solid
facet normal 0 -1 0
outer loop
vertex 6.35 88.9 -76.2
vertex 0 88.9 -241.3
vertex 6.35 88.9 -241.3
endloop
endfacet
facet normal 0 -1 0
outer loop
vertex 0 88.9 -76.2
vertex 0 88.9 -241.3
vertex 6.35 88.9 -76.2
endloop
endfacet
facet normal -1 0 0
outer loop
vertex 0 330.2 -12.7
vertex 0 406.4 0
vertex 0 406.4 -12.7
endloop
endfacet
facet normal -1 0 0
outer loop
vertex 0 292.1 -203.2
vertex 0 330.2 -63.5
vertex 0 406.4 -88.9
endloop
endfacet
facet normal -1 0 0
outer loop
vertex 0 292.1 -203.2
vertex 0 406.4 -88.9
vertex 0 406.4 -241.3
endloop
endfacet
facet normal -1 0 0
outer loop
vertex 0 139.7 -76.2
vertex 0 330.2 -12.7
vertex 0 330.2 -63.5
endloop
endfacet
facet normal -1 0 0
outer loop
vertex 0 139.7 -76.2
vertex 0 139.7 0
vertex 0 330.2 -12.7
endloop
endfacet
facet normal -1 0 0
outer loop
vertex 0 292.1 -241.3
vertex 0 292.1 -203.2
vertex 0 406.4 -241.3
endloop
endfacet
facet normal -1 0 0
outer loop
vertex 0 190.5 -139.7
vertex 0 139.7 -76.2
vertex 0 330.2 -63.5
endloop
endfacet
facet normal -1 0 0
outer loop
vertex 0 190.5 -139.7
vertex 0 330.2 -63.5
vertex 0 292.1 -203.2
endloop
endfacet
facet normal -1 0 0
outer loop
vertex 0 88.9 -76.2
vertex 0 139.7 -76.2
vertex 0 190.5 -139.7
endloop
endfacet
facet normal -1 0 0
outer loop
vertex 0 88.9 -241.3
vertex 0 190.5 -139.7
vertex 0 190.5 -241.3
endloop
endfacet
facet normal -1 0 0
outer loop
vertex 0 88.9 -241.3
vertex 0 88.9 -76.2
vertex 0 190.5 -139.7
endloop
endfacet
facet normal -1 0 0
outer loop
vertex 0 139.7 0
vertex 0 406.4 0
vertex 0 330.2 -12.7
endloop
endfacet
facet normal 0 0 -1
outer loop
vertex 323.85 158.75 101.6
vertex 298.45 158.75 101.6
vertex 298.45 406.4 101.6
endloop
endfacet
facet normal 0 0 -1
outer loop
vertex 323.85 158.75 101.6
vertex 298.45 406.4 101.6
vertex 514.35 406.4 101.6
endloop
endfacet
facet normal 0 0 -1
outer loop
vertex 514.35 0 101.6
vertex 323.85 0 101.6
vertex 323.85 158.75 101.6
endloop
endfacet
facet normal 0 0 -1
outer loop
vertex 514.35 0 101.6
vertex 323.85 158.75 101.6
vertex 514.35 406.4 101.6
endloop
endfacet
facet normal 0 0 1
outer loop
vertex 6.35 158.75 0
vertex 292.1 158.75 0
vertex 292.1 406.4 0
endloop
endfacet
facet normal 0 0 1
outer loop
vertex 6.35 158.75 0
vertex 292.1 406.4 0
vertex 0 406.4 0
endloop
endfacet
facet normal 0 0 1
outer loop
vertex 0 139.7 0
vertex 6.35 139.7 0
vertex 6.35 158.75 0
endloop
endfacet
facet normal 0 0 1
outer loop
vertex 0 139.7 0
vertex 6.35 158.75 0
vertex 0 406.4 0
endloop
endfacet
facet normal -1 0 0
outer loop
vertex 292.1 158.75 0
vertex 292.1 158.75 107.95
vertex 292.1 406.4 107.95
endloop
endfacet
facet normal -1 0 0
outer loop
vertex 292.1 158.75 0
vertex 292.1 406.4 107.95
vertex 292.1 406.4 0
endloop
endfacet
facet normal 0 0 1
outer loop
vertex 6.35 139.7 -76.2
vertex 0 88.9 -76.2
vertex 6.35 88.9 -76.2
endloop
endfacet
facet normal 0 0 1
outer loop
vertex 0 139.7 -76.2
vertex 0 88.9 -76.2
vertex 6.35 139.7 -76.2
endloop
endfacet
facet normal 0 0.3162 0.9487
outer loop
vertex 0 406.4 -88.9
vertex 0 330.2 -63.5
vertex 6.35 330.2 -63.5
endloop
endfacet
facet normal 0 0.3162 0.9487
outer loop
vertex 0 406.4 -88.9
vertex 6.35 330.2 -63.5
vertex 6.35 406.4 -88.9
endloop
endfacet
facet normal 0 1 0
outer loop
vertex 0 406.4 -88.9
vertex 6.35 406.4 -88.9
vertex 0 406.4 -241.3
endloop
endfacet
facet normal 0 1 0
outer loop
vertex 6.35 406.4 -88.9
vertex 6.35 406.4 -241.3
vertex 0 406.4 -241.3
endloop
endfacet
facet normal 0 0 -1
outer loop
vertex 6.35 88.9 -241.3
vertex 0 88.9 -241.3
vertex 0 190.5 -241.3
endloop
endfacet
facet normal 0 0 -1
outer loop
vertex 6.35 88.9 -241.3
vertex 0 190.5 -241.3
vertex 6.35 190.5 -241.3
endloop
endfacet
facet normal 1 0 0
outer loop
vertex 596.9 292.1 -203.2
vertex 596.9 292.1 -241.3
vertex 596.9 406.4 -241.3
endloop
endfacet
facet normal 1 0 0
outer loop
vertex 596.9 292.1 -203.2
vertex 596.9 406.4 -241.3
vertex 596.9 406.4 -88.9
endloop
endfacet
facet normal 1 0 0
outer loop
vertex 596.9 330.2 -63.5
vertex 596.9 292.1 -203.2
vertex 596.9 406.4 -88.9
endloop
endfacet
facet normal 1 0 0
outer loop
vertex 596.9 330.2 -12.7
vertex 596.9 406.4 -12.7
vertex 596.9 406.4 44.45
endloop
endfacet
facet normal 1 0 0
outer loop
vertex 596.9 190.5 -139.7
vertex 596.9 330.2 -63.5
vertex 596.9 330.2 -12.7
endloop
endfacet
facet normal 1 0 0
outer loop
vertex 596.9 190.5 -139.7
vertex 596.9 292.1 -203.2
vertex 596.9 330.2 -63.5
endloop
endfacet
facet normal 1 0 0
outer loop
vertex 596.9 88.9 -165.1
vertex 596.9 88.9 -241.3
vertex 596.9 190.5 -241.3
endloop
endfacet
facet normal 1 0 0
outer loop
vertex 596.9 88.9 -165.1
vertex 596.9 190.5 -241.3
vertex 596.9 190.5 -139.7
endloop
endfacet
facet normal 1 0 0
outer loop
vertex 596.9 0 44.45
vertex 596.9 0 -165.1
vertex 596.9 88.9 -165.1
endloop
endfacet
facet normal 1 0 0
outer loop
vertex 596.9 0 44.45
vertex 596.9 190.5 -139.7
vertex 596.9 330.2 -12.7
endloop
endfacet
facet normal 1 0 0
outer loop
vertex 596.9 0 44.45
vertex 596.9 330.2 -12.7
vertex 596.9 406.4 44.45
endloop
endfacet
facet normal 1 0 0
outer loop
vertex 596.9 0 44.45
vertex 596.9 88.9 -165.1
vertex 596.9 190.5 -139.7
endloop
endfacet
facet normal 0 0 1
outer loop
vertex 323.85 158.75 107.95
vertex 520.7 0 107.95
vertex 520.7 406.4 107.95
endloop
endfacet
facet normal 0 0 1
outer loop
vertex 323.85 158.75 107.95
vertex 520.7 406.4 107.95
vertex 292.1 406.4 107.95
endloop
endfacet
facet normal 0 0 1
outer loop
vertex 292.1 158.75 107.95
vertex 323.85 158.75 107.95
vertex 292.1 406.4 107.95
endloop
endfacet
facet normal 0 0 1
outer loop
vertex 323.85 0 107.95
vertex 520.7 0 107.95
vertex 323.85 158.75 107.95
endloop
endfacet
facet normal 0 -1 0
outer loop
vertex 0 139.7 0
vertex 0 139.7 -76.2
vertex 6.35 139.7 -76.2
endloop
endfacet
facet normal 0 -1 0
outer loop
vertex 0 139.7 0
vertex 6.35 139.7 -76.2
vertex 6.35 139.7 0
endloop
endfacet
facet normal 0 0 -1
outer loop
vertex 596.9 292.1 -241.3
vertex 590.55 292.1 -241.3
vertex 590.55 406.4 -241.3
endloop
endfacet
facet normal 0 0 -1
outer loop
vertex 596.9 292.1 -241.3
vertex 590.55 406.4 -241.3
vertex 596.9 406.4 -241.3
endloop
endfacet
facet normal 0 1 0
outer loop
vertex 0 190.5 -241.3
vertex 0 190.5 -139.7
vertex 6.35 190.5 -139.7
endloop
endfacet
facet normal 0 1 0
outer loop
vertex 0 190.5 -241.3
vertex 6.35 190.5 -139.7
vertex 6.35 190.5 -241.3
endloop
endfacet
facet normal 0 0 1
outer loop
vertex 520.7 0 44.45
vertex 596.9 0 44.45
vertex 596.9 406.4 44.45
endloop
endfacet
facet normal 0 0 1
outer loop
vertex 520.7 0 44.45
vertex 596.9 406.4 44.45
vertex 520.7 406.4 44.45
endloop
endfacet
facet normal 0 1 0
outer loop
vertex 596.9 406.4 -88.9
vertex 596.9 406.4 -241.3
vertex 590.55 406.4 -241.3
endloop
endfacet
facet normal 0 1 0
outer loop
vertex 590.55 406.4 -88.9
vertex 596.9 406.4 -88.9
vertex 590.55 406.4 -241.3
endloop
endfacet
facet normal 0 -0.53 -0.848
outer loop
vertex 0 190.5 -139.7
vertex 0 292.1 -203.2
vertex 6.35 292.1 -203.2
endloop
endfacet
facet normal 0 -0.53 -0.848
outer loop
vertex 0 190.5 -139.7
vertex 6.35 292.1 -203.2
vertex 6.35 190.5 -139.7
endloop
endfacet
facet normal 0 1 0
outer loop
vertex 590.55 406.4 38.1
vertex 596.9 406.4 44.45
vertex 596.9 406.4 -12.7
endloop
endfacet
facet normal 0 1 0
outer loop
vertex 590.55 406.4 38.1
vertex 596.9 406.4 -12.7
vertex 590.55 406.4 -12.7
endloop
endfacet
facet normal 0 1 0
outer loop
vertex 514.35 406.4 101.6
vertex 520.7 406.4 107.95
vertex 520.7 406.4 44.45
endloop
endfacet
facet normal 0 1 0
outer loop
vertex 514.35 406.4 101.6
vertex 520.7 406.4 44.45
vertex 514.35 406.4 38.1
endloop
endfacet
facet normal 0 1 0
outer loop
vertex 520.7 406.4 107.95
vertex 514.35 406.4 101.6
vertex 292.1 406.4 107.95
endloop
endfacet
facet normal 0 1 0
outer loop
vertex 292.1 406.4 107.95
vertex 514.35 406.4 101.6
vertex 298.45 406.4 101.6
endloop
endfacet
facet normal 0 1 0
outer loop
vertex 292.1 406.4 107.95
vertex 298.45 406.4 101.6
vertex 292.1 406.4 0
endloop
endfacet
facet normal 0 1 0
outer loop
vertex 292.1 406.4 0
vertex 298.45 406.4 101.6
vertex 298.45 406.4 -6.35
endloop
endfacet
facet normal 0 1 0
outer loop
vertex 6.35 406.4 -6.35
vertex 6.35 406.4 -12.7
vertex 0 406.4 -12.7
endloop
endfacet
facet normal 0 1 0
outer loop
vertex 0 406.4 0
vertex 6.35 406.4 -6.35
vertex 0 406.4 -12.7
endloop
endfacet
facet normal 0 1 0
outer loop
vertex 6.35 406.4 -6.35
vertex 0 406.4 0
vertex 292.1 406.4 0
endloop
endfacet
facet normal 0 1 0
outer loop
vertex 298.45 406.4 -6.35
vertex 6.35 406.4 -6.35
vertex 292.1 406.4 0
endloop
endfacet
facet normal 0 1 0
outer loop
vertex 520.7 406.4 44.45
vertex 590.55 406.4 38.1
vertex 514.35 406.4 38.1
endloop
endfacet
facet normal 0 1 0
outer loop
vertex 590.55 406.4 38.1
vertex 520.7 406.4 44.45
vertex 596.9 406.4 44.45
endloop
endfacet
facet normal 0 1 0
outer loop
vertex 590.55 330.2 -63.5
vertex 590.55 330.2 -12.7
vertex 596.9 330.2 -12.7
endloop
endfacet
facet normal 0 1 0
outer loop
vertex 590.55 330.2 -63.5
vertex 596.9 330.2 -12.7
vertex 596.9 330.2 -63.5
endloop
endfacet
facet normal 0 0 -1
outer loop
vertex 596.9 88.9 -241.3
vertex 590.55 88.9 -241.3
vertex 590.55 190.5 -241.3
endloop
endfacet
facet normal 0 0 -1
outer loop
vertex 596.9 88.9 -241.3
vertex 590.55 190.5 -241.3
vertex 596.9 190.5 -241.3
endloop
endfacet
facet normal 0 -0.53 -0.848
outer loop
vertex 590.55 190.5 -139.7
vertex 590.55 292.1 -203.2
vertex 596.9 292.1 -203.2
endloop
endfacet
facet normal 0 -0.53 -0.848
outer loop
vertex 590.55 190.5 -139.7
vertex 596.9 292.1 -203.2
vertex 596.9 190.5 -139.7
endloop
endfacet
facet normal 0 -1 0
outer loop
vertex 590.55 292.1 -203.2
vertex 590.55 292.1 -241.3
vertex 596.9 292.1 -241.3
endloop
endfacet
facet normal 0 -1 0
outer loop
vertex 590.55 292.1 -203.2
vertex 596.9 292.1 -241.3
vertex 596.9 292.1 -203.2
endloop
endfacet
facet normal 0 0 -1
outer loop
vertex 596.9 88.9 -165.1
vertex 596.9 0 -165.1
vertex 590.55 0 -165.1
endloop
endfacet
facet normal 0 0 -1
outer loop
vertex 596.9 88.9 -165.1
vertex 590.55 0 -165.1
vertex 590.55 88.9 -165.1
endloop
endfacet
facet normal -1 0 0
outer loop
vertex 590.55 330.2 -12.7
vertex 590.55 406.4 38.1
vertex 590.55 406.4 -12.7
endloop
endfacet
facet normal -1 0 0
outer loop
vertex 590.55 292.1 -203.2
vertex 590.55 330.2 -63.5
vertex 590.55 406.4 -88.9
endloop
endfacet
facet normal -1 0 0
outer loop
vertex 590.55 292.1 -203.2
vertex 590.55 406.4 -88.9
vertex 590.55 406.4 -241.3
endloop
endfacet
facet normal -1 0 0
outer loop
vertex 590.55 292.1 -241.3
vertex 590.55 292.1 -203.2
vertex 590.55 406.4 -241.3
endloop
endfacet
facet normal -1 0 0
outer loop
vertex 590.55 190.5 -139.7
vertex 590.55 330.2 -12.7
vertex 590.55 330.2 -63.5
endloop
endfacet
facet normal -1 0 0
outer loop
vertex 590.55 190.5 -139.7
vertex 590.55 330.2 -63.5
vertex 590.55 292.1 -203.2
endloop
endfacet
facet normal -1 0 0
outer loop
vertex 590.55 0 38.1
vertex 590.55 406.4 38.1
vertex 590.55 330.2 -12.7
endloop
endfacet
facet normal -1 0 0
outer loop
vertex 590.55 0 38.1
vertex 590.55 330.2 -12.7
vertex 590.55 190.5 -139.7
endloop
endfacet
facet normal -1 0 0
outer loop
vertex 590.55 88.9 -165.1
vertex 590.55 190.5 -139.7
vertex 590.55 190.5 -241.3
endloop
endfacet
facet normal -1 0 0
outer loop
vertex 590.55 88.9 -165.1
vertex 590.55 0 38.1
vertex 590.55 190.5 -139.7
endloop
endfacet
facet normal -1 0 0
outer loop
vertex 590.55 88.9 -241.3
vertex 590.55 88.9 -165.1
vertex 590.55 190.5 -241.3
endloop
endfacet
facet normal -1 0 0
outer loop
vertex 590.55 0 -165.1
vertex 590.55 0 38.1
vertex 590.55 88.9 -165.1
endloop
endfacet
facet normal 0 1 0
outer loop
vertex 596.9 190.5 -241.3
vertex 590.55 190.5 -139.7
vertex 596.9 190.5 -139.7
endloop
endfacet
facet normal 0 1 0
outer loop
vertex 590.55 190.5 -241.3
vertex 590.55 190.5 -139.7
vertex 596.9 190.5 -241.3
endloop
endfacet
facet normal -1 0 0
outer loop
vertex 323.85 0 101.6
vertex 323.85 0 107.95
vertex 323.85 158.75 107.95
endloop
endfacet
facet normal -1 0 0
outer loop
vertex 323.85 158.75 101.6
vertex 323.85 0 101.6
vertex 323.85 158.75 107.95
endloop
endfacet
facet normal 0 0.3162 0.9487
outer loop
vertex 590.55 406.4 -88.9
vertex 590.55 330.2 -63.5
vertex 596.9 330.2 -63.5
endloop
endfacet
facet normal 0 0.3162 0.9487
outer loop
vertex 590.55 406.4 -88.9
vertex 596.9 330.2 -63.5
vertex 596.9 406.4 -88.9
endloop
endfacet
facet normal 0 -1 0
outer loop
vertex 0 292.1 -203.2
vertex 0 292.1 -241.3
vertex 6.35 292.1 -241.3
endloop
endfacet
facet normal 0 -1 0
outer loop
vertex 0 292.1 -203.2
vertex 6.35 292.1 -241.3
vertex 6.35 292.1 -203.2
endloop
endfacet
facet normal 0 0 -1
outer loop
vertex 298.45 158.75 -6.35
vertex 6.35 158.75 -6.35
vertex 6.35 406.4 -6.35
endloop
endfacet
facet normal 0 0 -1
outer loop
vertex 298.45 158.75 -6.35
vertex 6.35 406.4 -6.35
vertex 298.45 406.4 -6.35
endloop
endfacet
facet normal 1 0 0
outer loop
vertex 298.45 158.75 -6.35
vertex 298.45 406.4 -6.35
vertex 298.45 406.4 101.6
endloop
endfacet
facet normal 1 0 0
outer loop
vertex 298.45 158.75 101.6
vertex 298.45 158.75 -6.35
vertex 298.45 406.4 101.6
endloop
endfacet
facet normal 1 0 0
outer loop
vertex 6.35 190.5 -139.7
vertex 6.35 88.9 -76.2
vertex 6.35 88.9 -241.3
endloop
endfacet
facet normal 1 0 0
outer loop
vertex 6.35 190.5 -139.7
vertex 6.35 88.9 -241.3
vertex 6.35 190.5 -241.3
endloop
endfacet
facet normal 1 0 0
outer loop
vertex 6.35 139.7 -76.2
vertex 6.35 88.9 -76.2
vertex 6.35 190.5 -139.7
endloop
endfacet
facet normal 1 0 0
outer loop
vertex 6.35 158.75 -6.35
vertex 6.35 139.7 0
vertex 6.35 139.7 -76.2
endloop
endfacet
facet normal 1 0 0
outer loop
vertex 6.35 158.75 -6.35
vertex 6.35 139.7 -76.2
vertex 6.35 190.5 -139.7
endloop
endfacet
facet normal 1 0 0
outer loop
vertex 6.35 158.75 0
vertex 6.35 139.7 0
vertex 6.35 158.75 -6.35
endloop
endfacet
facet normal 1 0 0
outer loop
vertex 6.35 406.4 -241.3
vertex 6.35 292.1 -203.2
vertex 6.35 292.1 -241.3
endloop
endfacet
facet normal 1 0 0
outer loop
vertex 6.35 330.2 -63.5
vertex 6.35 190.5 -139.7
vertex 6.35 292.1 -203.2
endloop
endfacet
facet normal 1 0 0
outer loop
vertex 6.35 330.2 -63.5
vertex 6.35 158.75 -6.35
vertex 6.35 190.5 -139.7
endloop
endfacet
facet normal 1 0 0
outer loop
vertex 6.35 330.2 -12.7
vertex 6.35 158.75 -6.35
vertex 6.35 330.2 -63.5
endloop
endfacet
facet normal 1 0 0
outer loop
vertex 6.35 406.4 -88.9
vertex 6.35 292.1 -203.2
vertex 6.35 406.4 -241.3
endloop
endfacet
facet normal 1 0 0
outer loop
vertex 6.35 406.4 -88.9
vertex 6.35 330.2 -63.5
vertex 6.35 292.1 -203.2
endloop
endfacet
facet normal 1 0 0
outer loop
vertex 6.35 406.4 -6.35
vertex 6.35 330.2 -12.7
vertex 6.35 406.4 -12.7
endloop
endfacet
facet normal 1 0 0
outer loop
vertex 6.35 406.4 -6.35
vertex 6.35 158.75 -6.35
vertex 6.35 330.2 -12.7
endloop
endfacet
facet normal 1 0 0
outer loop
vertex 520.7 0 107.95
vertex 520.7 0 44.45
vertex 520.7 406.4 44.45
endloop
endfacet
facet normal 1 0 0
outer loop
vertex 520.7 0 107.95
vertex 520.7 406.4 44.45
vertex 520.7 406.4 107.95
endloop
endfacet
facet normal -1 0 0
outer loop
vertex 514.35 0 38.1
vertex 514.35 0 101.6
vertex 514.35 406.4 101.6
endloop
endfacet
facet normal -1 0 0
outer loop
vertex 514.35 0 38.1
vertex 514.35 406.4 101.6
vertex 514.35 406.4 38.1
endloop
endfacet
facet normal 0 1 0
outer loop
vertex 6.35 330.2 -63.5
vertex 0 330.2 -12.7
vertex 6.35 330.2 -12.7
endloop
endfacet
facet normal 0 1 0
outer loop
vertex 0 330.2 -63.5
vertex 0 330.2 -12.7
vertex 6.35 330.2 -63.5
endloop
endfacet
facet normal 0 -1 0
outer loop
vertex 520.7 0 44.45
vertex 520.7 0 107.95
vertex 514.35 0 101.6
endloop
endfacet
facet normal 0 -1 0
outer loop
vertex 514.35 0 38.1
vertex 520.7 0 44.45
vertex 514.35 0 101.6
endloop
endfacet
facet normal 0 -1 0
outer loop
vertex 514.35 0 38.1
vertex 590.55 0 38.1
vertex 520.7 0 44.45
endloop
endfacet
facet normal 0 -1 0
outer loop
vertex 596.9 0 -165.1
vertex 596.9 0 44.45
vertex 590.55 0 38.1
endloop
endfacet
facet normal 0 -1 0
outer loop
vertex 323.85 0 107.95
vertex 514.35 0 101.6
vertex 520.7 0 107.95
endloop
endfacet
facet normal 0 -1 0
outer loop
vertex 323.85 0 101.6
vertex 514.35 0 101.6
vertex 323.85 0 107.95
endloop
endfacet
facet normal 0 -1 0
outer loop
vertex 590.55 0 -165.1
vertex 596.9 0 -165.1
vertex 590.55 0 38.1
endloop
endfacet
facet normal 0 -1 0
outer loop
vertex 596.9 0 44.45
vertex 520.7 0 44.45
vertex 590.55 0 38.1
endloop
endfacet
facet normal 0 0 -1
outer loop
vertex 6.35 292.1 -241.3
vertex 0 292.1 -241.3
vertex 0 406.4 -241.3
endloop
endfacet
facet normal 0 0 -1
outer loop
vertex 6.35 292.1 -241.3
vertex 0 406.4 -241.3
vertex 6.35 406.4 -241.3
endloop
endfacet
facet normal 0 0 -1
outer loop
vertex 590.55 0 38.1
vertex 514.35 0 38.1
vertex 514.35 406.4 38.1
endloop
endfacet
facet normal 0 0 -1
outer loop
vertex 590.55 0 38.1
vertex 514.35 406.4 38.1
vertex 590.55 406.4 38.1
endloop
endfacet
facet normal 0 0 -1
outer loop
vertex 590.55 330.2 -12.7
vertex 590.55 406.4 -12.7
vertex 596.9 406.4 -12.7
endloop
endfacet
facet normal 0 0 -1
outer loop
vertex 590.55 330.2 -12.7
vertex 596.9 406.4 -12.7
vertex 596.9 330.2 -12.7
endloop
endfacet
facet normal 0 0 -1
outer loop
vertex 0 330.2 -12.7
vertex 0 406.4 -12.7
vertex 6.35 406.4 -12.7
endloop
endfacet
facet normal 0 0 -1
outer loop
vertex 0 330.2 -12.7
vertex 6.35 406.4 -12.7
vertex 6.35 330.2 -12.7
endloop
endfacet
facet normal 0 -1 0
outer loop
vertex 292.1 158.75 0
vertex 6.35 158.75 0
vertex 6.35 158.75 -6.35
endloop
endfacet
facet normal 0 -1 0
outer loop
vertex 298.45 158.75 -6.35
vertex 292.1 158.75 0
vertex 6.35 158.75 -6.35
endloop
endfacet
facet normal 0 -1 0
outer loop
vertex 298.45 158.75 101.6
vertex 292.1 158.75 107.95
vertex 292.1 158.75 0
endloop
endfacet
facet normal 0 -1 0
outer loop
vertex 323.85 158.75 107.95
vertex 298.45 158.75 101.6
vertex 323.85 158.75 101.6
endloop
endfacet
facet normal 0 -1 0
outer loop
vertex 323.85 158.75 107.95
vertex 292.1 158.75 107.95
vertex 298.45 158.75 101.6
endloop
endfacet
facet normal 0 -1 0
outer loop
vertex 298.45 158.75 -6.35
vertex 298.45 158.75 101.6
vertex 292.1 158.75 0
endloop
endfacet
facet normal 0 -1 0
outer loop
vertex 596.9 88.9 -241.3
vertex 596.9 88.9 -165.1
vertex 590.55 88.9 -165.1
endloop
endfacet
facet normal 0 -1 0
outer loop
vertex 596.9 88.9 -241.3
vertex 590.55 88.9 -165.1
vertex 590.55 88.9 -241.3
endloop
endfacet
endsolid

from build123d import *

# Parameters (mm, degrees)
BOSS_EXTRUDE1_DEPTH = 406.4
SKETCH2_W           = 317.5
SKETCH2_H           = 158.75
CUT_EXTRUDE1_DEPTH  = 114.3
CUT_EXTRUDE2_REACH  = 598.9
CUT_EXTRUDE3_REACH  = 598.9
SKETCH4_W           = 76.2
SKETCH4_H           = 88.9
CUT_EXTRUDE5_DEPTH  = 597.9


with BuildPart() as part:
    # Sketch1 → Boss-Extrude1 (new body)
    with BuildSketch(Plane(origin=(0, 0, 0), x_dir=(1, 0, 0), z_dir=(0, 1, 0))):
        Polygon((0, 0), (0, 241.3), (6.35, 241.3), (6.35, 6.35), (298.45, 6.35), (298.45, -101.6), (514.35, -101.6), (514.35, -38.1), (590.55, -38.1), (590.55, 241.3), (596.9, 241.3), (596.9, -44.45), (520.7, -44.45), (520.7, -107.95), (292.1, -107.95), (292.1, 0), align=None)
    extrude(amount=BOSS_EXTRUDE1_DEPTH)

    # Sketch2 → Cut-Extrude1 (cut)
    with BuildSketch(Plane.XY.offset(107.95)):
        with Locations((165.1, 79.375)):
            Rectangle(SKETCH2_W, SKETCH2_H)
    extrude(amount=-CUT_EXTRUDE1_DEPTH, mode=Mode.SUBTRACT)

    # Sketch3 → Cut-Extrude2 (cut, up to next)
    with BuildSketch(Plane.ZY, mode=Mode.PRIVATE) as cut_extrude2_sk1:
        Polygon((-76.2, 88.9), (-76.2, 139.7), (0, 139.7), (0, 0), (-241.3, 0), (-241.3, 88.9), align=None)
    cut_extrude2_tool1 = extrude(cut_extrude2_sk1.sketch, amount=-CUT_EXTRUDE2_REACH, mode=Mode.PRIVATE) & part.part
    add(cut_extrude2_tool1.solids().sort_by_distance((0, 55.127707, -108.030892))[0], mode=Mode.SUBTRACT)

    # Sketch4 → Cut-Extrude3 (cut, up to next)
    with BuildSketch(Plane(origin=(596.9, 0, 0), x_dir=(0, 0, -1), z_dir=(1, 0, 0)), mode=Mode.PRIVATE) as cut_extrude3_sk1:
        with Locations((203.2, 44.45)):
            Rectangle(SKETCH4_W, SKETCH4_H)
    cut_extrude3_tool1 = extrude(cut_extrude3_sk1.sketch, amount=-CUT_EXTRUDE3_REACH, mode=Mode.PRIVATE) & part.part
    add(cut_extrude3_tool1.solids().sort_by_distance((596.9, 44.45, -203.2))[0], mode=Mode.SUBTRACT)

    # Sketch6 → Cut-Extrude5 (cut, through all)
    with BuildSketch(Plane.ZY):
        Polygon((-241.3, 292.1), (-203.2, 292.1), (-139.7, 190.5), (-241.3, 190.5), align=None)
        Polygon((-88.9, 406.4), (-12.7, 406.4), (-12.7, 330.2), (-63.5, 330.2), align=None)
    extrude(amount=-CUT_EXTRUDE5_DEPTH, mode=Mode.SUBTRACT)


solid = part.part
